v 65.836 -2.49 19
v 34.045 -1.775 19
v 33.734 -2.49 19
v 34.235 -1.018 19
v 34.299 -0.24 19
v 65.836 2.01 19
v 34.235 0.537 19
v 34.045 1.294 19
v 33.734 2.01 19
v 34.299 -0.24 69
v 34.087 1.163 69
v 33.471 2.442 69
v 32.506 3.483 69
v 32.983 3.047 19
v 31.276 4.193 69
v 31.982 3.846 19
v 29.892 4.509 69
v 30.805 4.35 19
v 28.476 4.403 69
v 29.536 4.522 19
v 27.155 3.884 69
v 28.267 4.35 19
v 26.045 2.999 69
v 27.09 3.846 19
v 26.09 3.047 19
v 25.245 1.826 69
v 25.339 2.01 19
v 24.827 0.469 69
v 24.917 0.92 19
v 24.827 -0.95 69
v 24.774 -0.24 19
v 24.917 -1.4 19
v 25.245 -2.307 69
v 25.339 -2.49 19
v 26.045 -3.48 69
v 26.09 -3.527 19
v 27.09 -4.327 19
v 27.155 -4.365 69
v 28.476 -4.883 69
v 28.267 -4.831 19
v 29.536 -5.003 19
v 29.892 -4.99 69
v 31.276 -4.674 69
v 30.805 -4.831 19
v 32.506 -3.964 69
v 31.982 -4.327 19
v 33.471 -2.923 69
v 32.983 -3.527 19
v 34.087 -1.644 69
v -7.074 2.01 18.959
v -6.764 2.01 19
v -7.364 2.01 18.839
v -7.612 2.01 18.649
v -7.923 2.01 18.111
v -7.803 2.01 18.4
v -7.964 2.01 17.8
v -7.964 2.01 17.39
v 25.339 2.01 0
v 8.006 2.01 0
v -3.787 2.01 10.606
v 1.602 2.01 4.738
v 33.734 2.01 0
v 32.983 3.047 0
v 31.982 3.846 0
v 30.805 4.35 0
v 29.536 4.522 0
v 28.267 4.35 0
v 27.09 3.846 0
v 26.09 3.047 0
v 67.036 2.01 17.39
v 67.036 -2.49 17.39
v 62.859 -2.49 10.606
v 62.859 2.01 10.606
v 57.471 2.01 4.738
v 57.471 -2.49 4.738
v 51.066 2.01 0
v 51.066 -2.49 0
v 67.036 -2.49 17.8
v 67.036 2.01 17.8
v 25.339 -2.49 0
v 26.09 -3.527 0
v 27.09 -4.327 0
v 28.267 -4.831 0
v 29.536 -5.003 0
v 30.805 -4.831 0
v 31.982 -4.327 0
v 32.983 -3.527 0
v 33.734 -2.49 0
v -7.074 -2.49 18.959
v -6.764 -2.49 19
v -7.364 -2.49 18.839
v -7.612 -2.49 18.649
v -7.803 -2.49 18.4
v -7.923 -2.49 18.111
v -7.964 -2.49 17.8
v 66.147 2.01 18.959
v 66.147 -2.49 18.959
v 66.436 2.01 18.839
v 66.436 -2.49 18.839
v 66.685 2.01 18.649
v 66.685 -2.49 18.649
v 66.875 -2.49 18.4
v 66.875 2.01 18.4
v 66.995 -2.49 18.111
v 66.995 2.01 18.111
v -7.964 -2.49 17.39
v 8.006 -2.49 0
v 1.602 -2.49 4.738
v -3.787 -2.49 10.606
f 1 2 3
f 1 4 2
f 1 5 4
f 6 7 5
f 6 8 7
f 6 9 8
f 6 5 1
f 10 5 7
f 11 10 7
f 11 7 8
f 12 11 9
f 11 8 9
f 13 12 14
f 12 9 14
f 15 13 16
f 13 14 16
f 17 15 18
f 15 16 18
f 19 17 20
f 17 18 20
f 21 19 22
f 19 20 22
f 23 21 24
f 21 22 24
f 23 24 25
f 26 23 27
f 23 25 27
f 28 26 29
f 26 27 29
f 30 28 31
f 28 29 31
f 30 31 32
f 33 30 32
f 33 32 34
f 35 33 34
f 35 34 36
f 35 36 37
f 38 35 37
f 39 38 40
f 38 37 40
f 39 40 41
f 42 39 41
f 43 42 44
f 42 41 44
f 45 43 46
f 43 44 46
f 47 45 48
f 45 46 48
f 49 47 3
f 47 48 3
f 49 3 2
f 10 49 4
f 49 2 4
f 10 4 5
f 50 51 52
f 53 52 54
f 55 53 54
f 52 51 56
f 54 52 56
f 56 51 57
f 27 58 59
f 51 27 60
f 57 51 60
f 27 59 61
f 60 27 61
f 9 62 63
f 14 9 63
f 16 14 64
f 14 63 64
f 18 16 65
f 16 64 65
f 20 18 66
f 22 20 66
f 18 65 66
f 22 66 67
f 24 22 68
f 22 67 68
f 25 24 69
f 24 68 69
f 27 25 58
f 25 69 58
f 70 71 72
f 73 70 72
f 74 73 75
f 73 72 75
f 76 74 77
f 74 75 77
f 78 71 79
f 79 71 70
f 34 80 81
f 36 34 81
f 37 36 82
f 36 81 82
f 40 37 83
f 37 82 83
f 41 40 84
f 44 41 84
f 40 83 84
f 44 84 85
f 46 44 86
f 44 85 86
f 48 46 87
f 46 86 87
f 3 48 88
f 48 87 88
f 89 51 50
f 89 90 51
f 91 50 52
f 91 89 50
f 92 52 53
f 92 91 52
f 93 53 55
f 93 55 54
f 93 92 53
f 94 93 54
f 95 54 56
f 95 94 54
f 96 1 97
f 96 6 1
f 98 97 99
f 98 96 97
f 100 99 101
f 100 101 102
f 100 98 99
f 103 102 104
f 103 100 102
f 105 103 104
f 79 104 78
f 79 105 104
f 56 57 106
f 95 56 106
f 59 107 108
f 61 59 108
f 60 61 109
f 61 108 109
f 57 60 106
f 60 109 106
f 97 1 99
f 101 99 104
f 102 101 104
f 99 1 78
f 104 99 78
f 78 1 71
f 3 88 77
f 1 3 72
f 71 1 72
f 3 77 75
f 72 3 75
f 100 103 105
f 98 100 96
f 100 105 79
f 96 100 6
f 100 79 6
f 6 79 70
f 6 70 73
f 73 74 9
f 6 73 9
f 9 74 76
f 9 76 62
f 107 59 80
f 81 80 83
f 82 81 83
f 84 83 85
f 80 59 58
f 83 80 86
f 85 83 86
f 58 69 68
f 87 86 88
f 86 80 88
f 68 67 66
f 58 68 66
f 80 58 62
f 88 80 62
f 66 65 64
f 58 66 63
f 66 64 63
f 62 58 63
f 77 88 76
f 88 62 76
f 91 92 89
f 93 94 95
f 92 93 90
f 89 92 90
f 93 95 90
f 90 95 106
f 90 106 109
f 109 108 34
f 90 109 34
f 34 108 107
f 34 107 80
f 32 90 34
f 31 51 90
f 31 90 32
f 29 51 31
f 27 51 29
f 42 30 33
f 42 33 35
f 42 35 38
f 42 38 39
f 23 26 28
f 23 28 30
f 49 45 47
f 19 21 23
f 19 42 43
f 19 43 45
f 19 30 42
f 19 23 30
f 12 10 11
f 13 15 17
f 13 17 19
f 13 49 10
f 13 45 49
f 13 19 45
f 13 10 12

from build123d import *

# Parameters (mm, degrees)
F1_DEPTH = 19
F2_R     = 4.7625
F3_DEPTH = 50
F5_DEPTH = 7.0135
F6_R     = 1.2


with BuildPart() as f1:
    # F0 (on Top) → F1 (new body)
    with BuildSketch(Plane.XY):
        with BuildLine():
            Line((25.3387194722, 2.0096014291), (-7.9637924397, 2.0096014291))
            Line((-7.9637924397, 2.0096014291), (-7.9637924397, -2.4903985709))
            Line((-7.9637924397, -2.4903985709), (25.3387194722, -2.4903985709))
            ThreePointArc((25.3387194722, -2.4903985709), (29.5362075603, -5.0028985709), (33.7336956484, -2.4903985709))
            Line((33.7336956484, -2.4903985709), (67.0362075603, -2.4903985709))
            Line((67.0362075603, -2.4903985709), (67.0362075603, 2.0096014291))
            Line((67.0362075603, 2.0096014291), (33.7336956484, 2.0096014291))
            ThreePointArc((33.7336956484, 2.0096014291), (29.5362075603, 4.5221014291), (25.3387194722, 2.0096014291))
        make_face()
    extrude(amount=F1_DEPTH)

    # F2 (on face) → F3 (join)
    with BuildSketch(Plane.XY.offset(19)):
        with Locations((29.5362075603, -0.2403985709)):
            Circle(F2_R)
    extrude(amount=F3_DEPTH)

    # F4 (on face) → F5 (cut, through all)
    with BuildSketch(Plane.XZ.offset(2.4903985709)):
        with BuildLine():
            ThreePointArc((68.2658283432, 20.1410173709), (61.3045105, 8.6713769002), (51.0663553295, 0))
            Line((51.0663553295, 0), (68.7501132488, 0))
            Line((68.7501132488, 0), (68.2658283432, 20.1410173709))
        make_face()
        with BuildLine():
            ThreePointArc((8.0060597912, 0), (-2.1784408901, 8.6086716648), (-9.1312425211, 19.9881194299))
            Line((-9.1312425211, 19.9881194299), (-9.1312425211, 0))
            Line((-9.1312425211, 0), (8.0060597912, 0))
        make_face()
    extrude(amount=-F5_DEPTH, mode=Mode.SUBTRACT)

    # F6
    f6_edges = [f1.edges().sort_by_distance(p)[0] for p in [
        (67.036208, -0.240399, 19),
        (-7.963792, -0.240399, 19),
    ]]
    fillet(f6_edges, radius=F6_R)


solid = f1.part
